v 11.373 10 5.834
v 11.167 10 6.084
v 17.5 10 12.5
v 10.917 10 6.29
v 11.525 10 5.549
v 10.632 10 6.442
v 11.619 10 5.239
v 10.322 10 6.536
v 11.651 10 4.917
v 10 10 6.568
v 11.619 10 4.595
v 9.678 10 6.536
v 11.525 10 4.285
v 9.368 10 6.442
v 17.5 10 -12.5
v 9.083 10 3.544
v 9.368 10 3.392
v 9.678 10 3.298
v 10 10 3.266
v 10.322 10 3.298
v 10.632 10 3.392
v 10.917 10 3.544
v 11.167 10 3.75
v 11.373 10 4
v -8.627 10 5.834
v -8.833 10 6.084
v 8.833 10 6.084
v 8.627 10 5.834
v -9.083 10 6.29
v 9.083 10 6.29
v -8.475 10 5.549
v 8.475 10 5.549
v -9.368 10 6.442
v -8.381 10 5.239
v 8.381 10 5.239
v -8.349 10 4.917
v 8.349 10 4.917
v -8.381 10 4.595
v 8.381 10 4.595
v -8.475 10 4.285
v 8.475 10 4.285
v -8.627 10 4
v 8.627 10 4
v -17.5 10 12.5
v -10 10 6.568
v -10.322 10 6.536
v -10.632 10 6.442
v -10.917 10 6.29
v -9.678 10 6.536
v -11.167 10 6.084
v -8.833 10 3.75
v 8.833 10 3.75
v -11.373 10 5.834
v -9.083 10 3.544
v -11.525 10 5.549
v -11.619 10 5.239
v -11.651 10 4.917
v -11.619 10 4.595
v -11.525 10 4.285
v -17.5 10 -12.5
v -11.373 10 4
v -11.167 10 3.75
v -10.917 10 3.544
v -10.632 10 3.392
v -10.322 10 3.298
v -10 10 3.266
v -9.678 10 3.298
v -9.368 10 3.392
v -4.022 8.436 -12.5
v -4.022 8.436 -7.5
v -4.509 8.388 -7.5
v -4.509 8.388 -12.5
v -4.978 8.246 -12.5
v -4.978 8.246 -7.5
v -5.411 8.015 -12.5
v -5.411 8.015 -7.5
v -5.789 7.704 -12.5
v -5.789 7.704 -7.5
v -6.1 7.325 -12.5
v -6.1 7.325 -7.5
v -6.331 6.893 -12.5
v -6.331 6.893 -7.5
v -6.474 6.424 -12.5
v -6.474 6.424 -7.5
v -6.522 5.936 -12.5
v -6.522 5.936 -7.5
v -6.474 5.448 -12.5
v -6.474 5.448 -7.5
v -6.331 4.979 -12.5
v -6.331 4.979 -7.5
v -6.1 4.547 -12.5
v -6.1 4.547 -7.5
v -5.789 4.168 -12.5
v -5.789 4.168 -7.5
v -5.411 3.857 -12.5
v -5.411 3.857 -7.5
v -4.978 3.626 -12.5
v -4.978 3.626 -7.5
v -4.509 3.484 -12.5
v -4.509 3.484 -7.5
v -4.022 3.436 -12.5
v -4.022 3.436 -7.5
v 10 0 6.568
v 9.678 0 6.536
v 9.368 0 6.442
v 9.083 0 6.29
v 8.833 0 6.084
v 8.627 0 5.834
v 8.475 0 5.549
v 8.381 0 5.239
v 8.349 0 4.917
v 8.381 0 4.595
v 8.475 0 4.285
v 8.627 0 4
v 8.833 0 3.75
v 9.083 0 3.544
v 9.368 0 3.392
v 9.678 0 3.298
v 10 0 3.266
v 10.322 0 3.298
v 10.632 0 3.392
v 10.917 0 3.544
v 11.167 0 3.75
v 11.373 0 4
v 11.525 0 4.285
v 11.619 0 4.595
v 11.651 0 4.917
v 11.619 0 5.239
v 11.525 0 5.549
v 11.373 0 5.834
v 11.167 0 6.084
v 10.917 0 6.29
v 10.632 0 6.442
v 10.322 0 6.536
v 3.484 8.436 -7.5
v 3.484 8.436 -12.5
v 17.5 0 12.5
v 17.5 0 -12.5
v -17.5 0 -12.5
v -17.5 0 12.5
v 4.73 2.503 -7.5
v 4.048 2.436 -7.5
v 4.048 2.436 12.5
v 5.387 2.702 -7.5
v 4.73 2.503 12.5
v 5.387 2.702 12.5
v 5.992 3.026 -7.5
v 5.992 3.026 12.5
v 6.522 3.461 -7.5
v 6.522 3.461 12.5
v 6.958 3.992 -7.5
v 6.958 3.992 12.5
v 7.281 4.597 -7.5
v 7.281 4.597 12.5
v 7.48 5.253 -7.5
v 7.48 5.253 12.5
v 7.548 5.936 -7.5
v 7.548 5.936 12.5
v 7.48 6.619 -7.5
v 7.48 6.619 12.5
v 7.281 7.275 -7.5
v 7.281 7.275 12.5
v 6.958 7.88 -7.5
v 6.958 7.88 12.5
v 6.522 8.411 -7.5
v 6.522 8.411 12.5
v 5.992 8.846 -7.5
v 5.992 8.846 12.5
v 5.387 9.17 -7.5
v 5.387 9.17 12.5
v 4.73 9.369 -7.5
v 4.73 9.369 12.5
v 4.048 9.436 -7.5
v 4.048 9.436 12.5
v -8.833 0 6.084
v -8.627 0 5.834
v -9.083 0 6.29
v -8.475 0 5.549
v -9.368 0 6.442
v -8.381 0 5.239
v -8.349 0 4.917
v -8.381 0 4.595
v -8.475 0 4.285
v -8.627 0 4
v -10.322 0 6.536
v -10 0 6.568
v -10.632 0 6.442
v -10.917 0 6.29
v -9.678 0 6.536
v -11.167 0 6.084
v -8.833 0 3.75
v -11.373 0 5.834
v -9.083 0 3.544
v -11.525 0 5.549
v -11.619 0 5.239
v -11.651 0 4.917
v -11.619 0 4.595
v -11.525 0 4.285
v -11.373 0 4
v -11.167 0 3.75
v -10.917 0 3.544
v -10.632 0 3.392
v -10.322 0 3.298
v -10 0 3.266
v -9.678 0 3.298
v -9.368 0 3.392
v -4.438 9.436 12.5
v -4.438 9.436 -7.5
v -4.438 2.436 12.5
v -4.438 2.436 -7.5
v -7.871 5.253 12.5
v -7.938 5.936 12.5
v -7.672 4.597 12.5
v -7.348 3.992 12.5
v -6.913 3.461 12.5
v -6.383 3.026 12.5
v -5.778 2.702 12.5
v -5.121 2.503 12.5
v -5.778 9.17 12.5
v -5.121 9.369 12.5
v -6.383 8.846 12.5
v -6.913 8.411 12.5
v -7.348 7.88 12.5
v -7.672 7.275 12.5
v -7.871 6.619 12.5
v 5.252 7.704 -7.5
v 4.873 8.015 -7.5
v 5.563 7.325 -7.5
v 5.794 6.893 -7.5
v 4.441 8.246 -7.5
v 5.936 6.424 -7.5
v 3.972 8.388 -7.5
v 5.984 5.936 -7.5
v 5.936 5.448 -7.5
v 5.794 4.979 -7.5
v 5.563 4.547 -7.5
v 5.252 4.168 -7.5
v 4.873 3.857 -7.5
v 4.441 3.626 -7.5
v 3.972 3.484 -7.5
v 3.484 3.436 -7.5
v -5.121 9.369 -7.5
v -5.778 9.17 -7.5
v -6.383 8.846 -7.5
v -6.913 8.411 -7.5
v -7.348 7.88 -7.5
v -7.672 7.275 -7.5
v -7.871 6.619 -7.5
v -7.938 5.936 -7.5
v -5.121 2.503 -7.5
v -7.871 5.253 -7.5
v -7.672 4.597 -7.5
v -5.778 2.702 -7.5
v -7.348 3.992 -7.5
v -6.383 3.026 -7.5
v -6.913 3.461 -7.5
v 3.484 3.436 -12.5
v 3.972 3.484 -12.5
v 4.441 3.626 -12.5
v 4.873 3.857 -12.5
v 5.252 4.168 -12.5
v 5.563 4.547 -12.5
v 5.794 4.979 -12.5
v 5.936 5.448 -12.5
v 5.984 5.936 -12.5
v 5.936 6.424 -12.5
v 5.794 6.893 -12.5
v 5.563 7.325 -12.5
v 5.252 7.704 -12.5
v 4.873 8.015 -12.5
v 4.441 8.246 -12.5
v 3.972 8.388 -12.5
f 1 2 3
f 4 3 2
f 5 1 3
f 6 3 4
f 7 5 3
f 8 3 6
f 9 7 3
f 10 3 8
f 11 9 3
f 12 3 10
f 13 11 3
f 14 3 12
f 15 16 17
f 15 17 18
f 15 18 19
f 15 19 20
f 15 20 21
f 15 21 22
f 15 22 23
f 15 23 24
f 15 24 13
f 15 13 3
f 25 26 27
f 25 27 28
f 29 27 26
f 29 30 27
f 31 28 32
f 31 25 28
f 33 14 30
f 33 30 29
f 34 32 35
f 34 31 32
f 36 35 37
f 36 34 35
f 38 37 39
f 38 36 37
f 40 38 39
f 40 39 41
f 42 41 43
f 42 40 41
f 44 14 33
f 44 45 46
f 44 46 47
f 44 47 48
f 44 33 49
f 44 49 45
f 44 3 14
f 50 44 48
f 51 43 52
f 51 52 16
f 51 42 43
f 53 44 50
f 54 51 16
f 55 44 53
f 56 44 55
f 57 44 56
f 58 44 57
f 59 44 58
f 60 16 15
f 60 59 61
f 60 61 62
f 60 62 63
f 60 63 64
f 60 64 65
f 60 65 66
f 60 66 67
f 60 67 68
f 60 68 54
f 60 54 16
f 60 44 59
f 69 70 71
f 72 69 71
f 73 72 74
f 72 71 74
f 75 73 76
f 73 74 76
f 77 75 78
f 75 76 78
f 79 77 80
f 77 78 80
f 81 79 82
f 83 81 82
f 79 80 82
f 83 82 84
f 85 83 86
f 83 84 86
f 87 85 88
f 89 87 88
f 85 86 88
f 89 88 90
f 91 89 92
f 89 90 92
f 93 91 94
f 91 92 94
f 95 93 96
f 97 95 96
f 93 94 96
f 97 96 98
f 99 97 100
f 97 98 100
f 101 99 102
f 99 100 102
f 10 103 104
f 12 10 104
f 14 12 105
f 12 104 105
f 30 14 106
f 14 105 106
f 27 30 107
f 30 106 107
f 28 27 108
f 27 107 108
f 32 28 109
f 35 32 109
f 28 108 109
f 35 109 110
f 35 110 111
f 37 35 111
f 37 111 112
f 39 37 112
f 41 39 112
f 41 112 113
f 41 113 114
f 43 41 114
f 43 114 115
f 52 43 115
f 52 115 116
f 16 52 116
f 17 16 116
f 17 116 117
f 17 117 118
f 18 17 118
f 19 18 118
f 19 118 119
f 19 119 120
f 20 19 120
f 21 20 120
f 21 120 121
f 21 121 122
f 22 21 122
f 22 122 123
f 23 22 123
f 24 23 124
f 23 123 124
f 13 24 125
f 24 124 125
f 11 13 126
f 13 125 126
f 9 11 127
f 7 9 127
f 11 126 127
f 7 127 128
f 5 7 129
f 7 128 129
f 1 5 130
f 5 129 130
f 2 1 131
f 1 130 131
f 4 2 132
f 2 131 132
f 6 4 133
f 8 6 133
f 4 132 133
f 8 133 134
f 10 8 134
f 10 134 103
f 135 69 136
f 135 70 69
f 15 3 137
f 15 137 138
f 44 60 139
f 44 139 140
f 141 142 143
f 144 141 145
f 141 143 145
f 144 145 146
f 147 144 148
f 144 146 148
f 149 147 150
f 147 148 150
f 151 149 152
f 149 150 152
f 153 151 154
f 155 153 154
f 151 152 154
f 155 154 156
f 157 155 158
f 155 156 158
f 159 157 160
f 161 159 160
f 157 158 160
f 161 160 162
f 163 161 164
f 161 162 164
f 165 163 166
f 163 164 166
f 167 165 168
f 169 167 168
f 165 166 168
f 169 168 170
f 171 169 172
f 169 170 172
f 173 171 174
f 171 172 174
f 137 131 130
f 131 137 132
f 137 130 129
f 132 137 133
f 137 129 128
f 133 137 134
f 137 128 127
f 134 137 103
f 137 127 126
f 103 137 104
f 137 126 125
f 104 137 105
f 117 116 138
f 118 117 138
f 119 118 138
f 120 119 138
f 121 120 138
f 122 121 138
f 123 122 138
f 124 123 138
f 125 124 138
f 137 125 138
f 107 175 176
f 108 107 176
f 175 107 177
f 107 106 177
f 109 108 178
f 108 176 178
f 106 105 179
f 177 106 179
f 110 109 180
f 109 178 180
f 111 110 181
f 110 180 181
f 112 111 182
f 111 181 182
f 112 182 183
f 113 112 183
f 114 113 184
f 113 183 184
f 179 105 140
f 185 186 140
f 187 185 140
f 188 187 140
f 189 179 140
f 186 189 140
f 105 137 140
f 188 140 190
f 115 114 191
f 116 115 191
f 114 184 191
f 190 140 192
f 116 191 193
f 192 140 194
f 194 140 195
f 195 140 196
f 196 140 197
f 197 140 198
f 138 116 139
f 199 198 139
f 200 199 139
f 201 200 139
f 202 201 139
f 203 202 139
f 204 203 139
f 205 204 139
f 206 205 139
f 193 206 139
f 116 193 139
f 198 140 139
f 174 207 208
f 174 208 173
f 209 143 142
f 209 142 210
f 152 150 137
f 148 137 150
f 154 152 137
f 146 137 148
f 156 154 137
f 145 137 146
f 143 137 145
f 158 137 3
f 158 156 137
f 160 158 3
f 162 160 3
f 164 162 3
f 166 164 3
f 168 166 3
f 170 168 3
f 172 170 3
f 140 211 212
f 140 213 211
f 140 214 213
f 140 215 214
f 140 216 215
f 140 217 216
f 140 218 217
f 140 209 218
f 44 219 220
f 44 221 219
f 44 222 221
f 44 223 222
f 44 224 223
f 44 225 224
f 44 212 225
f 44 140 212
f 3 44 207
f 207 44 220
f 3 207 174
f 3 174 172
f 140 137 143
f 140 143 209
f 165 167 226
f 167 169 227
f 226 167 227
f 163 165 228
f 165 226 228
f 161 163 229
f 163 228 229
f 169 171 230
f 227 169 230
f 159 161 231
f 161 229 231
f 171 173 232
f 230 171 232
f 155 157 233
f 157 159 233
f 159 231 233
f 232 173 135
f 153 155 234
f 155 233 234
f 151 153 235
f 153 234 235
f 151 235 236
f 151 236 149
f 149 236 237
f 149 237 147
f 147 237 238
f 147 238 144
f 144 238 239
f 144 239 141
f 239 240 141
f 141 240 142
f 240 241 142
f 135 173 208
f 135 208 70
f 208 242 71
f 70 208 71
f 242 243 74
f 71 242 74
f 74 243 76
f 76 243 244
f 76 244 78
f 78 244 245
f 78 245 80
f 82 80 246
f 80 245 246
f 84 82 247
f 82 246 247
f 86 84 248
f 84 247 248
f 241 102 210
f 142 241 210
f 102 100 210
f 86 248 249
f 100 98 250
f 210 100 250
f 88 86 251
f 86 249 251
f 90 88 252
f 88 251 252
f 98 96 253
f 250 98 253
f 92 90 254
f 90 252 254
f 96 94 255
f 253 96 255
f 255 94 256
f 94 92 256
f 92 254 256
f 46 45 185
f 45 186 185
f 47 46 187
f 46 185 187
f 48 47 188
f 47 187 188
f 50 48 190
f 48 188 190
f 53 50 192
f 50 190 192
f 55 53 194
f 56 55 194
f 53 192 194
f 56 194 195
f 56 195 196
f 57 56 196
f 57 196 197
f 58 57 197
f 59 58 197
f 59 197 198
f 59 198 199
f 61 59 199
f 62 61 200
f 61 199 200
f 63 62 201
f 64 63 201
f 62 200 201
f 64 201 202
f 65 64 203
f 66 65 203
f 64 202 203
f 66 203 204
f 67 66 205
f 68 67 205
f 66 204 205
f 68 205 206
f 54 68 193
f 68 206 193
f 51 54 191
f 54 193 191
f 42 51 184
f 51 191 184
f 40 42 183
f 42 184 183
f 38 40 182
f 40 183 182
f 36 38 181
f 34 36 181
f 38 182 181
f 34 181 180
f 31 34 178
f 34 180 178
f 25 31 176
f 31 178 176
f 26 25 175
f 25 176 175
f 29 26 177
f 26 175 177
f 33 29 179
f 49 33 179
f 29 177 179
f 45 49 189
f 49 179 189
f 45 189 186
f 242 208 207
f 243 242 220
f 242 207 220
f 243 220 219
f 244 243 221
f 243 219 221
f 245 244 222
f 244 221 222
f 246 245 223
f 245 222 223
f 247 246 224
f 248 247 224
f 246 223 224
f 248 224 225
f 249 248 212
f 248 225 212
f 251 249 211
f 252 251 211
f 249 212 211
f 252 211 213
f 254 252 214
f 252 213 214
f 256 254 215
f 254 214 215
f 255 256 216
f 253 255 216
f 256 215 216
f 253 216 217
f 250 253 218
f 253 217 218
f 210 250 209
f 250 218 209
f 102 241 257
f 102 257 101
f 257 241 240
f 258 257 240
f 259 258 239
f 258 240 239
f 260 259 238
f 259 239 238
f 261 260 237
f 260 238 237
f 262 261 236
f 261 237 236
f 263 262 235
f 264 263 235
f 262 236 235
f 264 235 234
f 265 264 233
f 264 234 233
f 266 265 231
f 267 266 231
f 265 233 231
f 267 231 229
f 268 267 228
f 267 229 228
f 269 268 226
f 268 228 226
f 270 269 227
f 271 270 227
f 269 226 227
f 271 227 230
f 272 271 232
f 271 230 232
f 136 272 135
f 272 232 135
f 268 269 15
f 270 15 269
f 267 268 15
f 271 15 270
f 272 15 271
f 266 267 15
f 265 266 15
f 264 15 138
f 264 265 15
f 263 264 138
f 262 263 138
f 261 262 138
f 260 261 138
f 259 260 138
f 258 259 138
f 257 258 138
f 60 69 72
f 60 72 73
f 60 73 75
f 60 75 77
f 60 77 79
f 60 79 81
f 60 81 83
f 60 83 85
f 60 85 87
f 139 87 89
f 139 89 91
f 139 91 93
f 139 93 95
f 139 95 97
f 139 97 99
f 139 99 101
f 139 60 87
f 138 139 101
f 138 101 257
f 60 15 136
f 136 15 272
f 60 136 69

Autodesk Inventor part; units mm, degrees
ref_plane "YZ Plane" through (0, 0, 0) normal (1, 0, 0) x (0, 1, 0)
ref_plane "XZ Plane" through (0, 0, 0) normal (0, 1, 0) x (-1, 0, 0)
ref_plane "XY Plane" through (0, 0, 0) normal (0, 0, 1) x (1, 0, 0)
sketch "Sketch1" plane through (0, 0, 0) normal (0, 1, 0) x (-1, 0, 0)
  line L0 (12.5, 12.5) -> (-12.5, 12.5)
  line L1 (-12.5, 12.5) -> (-12.5, -12.5)
  line L2 (-12.5, -12.5) -> (12.5, -12.5)
  line L3 (12.5, -12.5) -> (12.5, 12.5)
  line L4 (12.5, 12.5) -> (-12.5, -12.5) construction
  line L5 (-12.5, 12.5) -> (12.5, -12.5) construction
  point P0 (0, 0)
  dimension "d0" = 25
  dimension "d1" = 25
extrude "Extrusion1" add sketch "Sketch1" along normal blind 10
sketch "Sketch2" plane through (-12.5, 0, 12.5) normal (0, 0, 1) x (1, 0, 0)
  line L0 (25, 0) -> (25, 10) projected
  line L1 (0, 10) -> (25, 10) projected
  point P0 (12.5, 0)
  point P1 (12.5, 5.936)
  dimension "d12" = 4.064
hole "Hole1" at (0, 5.936, 12.5) direction (0, 0, -1) diameter 5 depth 25 counterbore diameter 7 counterbore depth 20
sketch "Sketch4" plane through (-12.5, 0, 12.5) normal (0, 0, 1) x (1, 0, 0)
  line L0 (4.5617, 5.936) -> (20.0475, 5.936) construction
  line L1 (8.0617, 9.436) -> (16.5475, 9.436)
  line L2 (16.5475, 2.436) -> (8.0617, 2.436)
  arc A0 (8.0617, 9.436) -> (8.0617, 2.436) centre (8.0617, 5.936) ccw
  arc A1 (16.5475, 2.436) -> (16.5475, 9.436) centre (16.5475, 5.936) ccw
  point P0 (12.5, 0)
  point P1 (12.3046, 5.936)
extrude "Extrusion2" cut sketch "Sketch4" against normal blind 20
sketch "Sketch5" plane through (-4.4383, 9.436, -7.5) normal (0, 0, 1) x (1, 0, 0)
  line L0 (-2.0833, -3.5) -> (10.4225, -3.5) construction
  line L1 (0.4167, -1) -> (7.9225, -1)
  line L2 (7.9225, -6) -> (0.4167, -6)
  arc A0 (0.4167, -1) -> (0.4167, -6) centre (0.4167, -3.5) ccw
  arc A1 (7.9225, -6) -> (7.9225, -1) centre (7.9225, -3.5) ccw
  point P0 (4.4383, -9.436)
  point P1 (4.1696, -3.5)
extrude "Extrusion3" cut sketch "Sketch5" against normal blind 20
sketch "Sketch6" plane through (-12.5, 0, -12.5) normal (-1, 0, 0) x (0, 0, 1)
  line L0 (25, 10) -> (0, 10) projected
  line L1 (0, 0) -> (25, 0) projected
  line L2 (0, 10) -> (25, 10)
  line L3 (25, 10) -> (25, 0)
  line L4 (25, 0) -> (0, 0)
  line L5 (0, 0) -> (0, 10)
  point P0 (12.5, 0)
extrude "Extrusion4" add sketch "Sketch6" along normal blind 5
sketch "Sketch7" plane through (12.5, 0, 12.5) normal (1, 0, 0) x (0, 0, -1)
  line L0 (0, 10) -> (25, 10) projected
  line L1 (0, 0) -> (25, 0) projected
  line L2 (0, 10) -> (25, 10)
  line L3 (25, 10) -> (25, 0)
  line L4 (25, 0) -> (0, 0)
  line L5 (0, 0) -> (0, 10)
  point P0 (12.5, 0)
extrude "Extrusion5" add sketch "Sketch7" along normal blind 5
sketch "Sketch8" plane through (0, 10, 0) normal (0, 1, 0) x (1, 0, 0)
  line L0 (-17.5, 12.5) -> (17.5, 12.5) projected
  line L1 (-17.5, -12.5) -> (-17.5, 12.5) projected
  line L2 (17.5, 12.5) -> (17.5, -12.5) projected
  point P0 (0, 0)
  point P1 (10, -4.917)
  point P2 (-10, -4.917)
  dimension "d28" = 17.417
  dimension "d29" = 17.417
  dimension "d30" = 7.5
  dimension "d31" = 7.5
hole "Hole2" at (10, 10, 4.917) at (-10, 10, 4.917) direction (0, -1, 0) diameter 3.302 depth 12.3 thread size "8-32 UNC" class "2B" standard "ANSI Unified Screw Threads"
properties part number "ResonantAdapter"
